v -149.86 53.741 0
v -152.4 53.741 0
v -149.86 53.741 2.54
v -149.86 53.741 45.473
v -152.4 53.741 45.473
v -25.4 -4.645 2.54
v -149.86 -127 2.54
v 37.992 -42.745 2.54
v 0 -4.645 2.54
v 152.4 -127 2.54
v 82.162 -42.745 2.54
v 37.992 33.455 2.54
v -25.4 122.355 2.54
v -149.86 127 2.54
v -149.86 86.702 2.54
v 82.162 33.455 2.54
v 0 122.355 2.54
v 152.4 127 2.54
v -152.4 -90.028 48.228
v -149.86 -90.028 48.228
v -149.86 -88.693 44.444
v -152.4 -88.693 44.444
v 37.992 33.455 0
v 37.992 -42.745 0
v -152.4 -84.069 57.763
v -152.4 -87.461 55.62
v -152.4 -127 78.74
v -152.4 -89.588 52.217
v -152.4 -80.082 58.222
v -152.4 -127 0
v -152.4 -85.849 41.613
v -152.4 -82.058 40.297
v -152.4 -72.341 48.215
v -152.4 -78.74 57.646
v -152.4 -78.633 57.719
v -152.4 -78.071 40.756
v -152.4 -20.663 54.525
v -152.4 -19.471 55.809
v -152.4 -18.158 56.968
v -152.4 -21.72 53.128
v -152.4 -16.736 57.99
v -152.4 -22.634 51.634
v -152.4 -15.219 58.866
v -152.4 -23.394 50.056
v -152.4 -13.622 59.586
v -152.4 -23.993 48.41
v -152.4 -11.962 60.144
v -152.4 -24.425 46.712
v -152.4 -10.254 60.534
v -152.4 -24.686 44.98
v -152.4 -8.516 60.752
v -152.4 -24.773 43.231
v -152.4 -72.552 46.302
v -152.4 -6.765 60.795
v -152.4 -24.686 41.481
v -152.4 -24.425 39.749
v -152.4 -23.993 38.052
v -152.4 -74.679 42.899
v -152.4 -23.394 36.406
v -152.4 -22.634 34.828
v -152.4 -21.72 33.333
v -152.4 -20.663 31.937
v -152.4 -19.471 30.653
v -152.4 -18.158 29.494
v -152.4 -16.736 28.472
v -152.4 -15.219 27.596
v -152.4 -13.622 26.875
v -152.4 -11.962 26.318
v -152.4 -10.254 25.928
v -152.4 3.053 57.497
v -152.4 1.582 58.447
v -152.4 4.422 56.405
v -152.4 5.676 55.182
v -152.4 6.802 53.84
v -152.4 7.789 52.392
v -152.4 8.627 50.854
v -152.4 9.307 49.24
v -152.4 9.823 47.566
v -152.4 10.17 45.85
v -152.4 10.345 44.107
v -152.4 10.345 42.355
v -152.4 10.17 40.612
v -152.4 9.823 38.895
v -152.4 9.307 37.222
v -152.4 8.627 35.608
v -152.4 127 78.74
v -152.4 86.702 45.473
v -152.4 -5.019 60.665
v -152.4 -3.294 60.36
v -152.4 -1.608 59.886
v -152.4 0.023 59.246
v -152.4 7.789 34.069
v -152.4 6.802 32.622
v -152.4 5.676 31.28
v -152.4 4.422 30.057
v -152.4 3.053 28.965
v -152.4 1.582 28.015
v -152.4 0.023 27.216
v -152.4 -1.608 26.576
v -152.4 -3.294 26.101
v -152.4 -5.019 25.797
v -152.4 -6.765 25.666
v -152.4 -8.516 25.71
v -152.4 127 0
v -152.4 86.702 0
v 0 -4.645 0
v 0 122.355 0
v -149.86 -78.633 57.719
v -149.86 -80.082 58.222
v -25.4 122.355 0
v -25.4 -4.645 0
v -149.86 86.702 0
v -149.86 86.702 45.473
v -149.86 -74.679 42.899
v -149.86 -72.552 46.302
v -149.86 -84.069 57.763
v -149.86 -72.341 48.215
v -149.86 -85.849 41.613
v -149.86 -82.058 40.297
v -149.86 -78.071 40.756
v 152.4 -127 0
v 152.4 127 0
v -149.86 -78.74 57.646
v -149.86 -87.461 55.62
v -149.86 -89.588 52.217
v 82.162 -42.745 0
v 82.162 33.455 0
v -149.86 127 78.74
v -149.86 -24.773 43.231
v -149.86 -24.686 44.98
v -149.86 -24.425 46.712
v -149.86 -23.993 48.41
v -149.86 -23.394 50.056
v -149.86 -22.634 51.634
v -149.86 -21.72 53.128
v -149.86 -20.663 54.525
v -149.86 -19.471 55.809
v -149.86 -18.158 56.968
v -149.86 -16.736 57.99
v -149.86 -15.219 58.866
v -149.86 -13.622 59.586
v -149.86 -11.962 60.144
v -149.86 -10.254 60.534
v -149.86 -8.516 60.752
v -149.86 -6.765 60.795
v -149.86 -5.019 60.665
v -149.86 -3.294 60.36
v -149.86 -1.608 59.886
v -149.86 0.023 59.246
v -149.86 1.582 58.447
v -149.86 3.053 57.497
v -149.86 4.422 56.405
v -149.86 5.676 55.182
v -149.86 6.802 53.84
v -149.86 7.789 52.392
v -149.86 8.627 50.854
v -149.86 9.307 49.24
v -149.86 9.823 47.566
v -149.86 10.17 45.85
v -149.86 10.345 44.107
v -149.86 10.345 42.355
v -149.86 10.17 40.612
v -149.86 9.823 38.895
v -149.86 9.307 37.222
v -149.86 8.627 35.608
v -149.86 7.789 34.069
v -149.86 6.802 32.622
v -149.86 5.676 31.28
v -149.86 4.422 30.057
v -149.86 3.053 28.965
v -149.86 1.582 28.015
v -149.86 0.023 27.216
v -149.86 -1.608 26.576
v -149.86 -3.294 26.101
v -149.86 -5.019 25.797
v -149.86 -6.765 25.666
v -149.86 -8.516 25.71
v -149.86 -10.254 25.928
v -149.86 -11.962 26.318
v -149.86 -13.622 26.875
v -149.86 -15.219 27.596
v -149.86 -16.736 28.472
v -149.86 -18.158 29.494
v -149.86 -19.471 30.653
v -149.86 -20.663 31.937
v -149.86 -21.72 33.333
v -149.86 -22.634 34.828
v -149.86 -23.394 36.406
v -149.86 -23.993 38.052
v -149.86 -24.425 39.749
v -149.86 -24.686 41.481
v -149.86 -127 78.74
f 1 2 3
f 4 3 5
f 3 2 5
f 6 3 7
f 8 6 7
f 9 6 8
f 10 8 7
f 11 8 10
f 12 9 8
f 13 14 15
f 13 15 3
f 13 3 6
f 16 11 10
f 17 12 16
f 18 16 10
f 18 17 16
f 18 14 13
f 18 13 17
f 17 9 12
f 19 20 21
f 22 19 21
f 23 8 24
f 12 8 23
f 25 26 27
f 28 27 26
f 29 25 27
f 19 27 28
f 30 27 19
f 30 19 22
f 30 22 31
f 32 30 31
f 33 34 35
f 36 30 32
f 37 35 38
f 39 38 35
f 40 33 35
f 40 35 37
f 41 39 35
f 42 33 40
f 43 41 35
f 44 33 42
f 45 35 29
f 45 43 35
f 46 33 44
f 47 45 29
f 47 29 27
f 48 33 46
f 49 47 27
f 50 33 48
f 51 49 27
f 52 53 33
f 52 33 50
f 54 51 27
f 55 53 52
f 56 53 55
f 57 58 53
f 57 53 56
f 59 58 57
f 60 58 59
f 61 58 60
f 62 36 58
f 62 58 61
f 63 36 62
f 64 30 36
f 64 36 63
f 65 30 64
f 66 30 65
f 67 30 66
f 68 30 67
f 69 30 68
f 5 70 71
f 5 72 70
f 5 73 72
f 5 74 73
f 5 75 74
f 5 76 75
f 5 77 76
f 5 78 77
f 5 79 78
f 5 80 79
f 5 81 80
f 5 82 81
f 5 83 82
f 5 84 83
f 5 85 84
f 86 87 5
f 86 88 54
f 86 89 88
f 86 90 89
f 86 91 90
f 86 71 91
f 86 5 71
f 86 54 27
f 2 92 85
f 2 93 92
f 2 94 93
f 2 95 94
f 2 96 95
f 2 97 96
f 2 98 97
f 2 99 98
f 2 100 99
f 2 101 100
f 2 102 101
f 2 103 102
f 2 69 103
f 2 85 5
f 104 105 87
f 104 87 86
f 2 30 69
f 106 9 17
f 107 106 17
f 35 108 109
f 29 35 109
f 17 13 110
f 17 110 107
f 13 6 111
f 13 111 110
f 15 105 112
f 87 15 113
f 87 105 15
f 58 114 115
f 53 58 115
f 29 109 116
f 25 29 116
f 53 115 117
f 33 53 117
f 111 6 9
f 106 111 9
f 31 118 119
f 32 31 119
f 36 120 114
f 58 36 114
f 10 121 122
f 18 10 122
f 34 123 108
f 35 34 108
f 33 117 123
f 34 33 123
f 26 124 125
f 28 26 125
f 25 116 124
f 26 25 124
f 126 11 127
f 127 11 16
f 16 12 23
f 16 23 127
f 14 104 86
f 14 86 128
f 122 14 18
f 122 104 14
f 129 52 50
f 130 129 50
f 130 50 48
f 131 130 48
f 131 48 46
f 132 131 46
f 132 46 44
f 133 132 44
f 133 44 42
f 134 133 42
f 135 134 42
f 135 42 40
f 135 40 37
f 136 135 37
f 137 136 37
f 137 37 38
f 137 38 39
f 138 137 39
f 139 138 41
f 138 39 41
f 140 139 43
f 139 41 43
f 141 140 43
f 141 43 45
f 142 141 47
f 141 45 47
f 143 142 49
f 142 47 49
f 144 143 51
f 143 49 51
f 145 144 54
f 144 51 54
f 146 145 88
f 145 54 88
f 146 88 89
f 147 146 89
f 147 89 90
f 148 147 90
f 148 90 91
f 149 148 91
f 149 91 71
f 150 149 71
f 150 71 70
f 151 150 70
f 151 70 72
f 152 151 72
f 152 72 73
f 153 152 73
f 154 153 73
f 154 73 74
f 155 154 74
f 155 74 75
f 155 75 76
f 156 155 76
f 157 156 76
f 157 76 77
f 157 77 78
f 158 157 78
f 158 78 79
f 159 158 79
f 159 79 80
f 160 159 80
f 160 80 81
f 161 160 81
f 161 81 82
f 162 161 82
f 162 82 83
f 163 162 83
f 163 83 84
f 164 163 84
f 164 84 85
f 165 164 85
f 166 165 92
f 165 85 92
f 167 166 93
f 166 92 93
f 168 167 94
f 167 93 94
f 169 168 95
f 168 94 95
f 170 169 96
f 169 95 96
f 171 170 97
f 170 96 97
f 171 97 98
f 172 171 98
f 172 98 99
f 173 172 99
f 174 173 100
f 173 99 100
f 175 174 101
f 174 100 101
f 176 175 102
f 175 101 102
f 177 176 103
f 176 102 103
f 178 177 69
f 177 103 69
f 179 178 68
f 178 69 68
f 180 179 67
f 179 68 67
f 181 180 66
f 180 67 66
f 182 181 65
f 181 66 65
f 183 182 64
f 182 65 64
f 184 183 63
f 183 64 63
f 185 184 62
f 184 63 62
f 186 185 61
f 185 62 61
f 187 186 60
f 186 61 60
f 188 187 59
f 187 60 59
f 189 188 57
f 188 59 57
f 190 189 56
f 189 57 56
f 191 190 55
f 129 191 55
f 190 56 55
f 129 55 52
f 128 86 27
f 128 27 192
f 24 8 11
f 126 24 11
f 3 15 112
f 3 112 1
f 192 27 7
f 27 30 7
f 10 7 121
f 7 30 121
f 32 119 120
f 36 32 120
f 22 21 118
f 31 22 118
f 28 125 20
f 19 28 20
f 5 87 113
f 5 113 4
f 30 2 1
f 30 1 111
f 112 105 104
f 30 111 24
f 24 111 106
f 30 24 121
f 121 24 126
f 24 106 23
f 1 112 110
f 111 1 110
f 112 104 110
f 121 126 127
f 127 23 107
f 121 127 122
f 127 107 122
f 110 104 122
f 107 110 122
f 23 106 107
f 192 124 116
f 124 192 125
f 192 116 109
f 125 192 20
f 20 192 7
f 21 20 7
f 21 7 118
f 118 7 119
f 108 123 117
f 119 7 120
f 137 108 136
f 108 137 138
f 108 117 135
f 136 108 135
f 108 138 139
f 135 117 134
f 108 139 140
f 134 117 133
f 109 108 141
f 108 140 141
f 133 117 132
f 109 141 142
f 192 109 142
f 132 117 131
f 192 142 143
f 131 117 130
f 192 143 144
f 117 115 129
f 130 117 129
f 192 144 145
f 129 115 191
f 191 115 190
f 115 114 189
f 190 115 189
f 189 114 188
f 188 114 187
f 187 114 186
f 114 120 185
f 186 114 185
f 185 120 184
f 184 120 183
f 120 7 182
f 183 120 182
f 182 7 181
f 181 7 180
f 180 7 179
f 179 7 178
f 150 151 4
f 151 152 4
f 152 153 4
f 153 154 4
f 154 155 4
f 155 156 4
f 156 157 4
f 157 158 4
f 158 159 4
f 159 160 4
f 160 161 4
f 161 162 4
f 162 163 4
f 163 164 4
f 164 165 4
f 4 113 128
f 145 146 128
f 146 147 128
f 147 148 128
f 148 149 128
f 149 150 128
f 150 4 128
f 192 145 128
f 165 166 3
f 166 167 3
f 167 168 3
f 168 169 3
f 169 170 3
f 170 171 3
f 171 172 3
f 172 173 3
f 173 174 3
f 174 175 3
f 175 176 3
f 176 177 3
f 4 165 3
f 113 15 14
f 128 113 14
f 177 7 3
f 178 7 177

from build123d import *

# Parameters (mm, degrees)
F0_W      = 304.8
F0_H      = 254
F1_DEPTH  = 2.54
F2_W      = 2.54
F2_H      = 254
F3_DEPTH  = 76.2
F4_W      = 32.960277
F4_H      = 45.472592
F5_DEPTH  = 2.54
F6_R      = 17.569994
F7_DEPTH  = 25.4
F9_DEPTH  = 25.4
F10_W     = 25.4
F10_H     = 127
F10_W_2   = 44.169486
F10_H_2   = 76.2
F11_DEPTH = 25.4


with BuildPart() as f1:
    # F0 (on Top) → F1 (new body)
    with BuildSketch(Plane.XY):
        Rectangle(F0_W, F0_H)
    extrude(amount=F1_DEPTH)

    # F2 (on face) → F3 (join)
    with BuildSketch(Plane.XY.offset(2.54)):
        with Locations((-151.13, 0)):
            Rectangle(F2_W, F2_H)
    extrude(amount=F3_DEPTH)

    # F4 (on face) → F5 (cut)
    with BuildSketch(Plane(origin=(-152.4, 0, 0), x_dir=(0, -1, 0), z_dir=(-1, 0, 0))):
        with Locations((-70.221598, 22.736296)):
            Rectangle(F4_W, F4_H)
    extrude(amount=-F5_DEPTH, mode=Mode.SUBTRACT)

    # F6 (on face) → F7 (cut)
    with BuildSketch(Plane(origin=(-152.4, 0, 0), x_dir=(0, -1, 0), z_dir=(-1, 0, 0))):
        with Locations((7.203376, 43.230873)):
            Circle(F6_R)
    extrude(amount=-F7_DEPTH, mode=Mode.SUBTRACT)

    # F8 (on face) → F9 (cut)
    with BuildSketch(Plane.YZ.offset(-149.86)):
        Polygon((-74.678751, 42.898838), (-72.551889, 46.301815), (-72.340945, 48.215244), (-78.74044, 57.646077), (-78.632851, 57.719084), (-80.081942, 58.222244), (-84.068573, 57.76337), (-87.461306, 55.620204), (-89.588167, 52.217227), (-90.027907, 48.22844), (-88.693429, 44.443871), (-85.849043, 41.613101), (-82.058114, 40.296798), (-78.071483, 40.755672), align=None)
    extrude(amount=-F9_DEPTH, mode=Mode.SUBTRACT)

    # F10 (on face) → F11 (cut)
    with BuildSketch(Plane.XY.offset(2.54)):
        with Locations((-12.7, 58.855257)):
            Rectangle(F10_W, F10_H)
        with Locations((60.076818, -4.644743)):
            Rectangle(F10_W_2, F10_H_2)
    extrude(amount=-F11_DEPTH, mode=Mode.SUBTRACT)


solid = f1.part
